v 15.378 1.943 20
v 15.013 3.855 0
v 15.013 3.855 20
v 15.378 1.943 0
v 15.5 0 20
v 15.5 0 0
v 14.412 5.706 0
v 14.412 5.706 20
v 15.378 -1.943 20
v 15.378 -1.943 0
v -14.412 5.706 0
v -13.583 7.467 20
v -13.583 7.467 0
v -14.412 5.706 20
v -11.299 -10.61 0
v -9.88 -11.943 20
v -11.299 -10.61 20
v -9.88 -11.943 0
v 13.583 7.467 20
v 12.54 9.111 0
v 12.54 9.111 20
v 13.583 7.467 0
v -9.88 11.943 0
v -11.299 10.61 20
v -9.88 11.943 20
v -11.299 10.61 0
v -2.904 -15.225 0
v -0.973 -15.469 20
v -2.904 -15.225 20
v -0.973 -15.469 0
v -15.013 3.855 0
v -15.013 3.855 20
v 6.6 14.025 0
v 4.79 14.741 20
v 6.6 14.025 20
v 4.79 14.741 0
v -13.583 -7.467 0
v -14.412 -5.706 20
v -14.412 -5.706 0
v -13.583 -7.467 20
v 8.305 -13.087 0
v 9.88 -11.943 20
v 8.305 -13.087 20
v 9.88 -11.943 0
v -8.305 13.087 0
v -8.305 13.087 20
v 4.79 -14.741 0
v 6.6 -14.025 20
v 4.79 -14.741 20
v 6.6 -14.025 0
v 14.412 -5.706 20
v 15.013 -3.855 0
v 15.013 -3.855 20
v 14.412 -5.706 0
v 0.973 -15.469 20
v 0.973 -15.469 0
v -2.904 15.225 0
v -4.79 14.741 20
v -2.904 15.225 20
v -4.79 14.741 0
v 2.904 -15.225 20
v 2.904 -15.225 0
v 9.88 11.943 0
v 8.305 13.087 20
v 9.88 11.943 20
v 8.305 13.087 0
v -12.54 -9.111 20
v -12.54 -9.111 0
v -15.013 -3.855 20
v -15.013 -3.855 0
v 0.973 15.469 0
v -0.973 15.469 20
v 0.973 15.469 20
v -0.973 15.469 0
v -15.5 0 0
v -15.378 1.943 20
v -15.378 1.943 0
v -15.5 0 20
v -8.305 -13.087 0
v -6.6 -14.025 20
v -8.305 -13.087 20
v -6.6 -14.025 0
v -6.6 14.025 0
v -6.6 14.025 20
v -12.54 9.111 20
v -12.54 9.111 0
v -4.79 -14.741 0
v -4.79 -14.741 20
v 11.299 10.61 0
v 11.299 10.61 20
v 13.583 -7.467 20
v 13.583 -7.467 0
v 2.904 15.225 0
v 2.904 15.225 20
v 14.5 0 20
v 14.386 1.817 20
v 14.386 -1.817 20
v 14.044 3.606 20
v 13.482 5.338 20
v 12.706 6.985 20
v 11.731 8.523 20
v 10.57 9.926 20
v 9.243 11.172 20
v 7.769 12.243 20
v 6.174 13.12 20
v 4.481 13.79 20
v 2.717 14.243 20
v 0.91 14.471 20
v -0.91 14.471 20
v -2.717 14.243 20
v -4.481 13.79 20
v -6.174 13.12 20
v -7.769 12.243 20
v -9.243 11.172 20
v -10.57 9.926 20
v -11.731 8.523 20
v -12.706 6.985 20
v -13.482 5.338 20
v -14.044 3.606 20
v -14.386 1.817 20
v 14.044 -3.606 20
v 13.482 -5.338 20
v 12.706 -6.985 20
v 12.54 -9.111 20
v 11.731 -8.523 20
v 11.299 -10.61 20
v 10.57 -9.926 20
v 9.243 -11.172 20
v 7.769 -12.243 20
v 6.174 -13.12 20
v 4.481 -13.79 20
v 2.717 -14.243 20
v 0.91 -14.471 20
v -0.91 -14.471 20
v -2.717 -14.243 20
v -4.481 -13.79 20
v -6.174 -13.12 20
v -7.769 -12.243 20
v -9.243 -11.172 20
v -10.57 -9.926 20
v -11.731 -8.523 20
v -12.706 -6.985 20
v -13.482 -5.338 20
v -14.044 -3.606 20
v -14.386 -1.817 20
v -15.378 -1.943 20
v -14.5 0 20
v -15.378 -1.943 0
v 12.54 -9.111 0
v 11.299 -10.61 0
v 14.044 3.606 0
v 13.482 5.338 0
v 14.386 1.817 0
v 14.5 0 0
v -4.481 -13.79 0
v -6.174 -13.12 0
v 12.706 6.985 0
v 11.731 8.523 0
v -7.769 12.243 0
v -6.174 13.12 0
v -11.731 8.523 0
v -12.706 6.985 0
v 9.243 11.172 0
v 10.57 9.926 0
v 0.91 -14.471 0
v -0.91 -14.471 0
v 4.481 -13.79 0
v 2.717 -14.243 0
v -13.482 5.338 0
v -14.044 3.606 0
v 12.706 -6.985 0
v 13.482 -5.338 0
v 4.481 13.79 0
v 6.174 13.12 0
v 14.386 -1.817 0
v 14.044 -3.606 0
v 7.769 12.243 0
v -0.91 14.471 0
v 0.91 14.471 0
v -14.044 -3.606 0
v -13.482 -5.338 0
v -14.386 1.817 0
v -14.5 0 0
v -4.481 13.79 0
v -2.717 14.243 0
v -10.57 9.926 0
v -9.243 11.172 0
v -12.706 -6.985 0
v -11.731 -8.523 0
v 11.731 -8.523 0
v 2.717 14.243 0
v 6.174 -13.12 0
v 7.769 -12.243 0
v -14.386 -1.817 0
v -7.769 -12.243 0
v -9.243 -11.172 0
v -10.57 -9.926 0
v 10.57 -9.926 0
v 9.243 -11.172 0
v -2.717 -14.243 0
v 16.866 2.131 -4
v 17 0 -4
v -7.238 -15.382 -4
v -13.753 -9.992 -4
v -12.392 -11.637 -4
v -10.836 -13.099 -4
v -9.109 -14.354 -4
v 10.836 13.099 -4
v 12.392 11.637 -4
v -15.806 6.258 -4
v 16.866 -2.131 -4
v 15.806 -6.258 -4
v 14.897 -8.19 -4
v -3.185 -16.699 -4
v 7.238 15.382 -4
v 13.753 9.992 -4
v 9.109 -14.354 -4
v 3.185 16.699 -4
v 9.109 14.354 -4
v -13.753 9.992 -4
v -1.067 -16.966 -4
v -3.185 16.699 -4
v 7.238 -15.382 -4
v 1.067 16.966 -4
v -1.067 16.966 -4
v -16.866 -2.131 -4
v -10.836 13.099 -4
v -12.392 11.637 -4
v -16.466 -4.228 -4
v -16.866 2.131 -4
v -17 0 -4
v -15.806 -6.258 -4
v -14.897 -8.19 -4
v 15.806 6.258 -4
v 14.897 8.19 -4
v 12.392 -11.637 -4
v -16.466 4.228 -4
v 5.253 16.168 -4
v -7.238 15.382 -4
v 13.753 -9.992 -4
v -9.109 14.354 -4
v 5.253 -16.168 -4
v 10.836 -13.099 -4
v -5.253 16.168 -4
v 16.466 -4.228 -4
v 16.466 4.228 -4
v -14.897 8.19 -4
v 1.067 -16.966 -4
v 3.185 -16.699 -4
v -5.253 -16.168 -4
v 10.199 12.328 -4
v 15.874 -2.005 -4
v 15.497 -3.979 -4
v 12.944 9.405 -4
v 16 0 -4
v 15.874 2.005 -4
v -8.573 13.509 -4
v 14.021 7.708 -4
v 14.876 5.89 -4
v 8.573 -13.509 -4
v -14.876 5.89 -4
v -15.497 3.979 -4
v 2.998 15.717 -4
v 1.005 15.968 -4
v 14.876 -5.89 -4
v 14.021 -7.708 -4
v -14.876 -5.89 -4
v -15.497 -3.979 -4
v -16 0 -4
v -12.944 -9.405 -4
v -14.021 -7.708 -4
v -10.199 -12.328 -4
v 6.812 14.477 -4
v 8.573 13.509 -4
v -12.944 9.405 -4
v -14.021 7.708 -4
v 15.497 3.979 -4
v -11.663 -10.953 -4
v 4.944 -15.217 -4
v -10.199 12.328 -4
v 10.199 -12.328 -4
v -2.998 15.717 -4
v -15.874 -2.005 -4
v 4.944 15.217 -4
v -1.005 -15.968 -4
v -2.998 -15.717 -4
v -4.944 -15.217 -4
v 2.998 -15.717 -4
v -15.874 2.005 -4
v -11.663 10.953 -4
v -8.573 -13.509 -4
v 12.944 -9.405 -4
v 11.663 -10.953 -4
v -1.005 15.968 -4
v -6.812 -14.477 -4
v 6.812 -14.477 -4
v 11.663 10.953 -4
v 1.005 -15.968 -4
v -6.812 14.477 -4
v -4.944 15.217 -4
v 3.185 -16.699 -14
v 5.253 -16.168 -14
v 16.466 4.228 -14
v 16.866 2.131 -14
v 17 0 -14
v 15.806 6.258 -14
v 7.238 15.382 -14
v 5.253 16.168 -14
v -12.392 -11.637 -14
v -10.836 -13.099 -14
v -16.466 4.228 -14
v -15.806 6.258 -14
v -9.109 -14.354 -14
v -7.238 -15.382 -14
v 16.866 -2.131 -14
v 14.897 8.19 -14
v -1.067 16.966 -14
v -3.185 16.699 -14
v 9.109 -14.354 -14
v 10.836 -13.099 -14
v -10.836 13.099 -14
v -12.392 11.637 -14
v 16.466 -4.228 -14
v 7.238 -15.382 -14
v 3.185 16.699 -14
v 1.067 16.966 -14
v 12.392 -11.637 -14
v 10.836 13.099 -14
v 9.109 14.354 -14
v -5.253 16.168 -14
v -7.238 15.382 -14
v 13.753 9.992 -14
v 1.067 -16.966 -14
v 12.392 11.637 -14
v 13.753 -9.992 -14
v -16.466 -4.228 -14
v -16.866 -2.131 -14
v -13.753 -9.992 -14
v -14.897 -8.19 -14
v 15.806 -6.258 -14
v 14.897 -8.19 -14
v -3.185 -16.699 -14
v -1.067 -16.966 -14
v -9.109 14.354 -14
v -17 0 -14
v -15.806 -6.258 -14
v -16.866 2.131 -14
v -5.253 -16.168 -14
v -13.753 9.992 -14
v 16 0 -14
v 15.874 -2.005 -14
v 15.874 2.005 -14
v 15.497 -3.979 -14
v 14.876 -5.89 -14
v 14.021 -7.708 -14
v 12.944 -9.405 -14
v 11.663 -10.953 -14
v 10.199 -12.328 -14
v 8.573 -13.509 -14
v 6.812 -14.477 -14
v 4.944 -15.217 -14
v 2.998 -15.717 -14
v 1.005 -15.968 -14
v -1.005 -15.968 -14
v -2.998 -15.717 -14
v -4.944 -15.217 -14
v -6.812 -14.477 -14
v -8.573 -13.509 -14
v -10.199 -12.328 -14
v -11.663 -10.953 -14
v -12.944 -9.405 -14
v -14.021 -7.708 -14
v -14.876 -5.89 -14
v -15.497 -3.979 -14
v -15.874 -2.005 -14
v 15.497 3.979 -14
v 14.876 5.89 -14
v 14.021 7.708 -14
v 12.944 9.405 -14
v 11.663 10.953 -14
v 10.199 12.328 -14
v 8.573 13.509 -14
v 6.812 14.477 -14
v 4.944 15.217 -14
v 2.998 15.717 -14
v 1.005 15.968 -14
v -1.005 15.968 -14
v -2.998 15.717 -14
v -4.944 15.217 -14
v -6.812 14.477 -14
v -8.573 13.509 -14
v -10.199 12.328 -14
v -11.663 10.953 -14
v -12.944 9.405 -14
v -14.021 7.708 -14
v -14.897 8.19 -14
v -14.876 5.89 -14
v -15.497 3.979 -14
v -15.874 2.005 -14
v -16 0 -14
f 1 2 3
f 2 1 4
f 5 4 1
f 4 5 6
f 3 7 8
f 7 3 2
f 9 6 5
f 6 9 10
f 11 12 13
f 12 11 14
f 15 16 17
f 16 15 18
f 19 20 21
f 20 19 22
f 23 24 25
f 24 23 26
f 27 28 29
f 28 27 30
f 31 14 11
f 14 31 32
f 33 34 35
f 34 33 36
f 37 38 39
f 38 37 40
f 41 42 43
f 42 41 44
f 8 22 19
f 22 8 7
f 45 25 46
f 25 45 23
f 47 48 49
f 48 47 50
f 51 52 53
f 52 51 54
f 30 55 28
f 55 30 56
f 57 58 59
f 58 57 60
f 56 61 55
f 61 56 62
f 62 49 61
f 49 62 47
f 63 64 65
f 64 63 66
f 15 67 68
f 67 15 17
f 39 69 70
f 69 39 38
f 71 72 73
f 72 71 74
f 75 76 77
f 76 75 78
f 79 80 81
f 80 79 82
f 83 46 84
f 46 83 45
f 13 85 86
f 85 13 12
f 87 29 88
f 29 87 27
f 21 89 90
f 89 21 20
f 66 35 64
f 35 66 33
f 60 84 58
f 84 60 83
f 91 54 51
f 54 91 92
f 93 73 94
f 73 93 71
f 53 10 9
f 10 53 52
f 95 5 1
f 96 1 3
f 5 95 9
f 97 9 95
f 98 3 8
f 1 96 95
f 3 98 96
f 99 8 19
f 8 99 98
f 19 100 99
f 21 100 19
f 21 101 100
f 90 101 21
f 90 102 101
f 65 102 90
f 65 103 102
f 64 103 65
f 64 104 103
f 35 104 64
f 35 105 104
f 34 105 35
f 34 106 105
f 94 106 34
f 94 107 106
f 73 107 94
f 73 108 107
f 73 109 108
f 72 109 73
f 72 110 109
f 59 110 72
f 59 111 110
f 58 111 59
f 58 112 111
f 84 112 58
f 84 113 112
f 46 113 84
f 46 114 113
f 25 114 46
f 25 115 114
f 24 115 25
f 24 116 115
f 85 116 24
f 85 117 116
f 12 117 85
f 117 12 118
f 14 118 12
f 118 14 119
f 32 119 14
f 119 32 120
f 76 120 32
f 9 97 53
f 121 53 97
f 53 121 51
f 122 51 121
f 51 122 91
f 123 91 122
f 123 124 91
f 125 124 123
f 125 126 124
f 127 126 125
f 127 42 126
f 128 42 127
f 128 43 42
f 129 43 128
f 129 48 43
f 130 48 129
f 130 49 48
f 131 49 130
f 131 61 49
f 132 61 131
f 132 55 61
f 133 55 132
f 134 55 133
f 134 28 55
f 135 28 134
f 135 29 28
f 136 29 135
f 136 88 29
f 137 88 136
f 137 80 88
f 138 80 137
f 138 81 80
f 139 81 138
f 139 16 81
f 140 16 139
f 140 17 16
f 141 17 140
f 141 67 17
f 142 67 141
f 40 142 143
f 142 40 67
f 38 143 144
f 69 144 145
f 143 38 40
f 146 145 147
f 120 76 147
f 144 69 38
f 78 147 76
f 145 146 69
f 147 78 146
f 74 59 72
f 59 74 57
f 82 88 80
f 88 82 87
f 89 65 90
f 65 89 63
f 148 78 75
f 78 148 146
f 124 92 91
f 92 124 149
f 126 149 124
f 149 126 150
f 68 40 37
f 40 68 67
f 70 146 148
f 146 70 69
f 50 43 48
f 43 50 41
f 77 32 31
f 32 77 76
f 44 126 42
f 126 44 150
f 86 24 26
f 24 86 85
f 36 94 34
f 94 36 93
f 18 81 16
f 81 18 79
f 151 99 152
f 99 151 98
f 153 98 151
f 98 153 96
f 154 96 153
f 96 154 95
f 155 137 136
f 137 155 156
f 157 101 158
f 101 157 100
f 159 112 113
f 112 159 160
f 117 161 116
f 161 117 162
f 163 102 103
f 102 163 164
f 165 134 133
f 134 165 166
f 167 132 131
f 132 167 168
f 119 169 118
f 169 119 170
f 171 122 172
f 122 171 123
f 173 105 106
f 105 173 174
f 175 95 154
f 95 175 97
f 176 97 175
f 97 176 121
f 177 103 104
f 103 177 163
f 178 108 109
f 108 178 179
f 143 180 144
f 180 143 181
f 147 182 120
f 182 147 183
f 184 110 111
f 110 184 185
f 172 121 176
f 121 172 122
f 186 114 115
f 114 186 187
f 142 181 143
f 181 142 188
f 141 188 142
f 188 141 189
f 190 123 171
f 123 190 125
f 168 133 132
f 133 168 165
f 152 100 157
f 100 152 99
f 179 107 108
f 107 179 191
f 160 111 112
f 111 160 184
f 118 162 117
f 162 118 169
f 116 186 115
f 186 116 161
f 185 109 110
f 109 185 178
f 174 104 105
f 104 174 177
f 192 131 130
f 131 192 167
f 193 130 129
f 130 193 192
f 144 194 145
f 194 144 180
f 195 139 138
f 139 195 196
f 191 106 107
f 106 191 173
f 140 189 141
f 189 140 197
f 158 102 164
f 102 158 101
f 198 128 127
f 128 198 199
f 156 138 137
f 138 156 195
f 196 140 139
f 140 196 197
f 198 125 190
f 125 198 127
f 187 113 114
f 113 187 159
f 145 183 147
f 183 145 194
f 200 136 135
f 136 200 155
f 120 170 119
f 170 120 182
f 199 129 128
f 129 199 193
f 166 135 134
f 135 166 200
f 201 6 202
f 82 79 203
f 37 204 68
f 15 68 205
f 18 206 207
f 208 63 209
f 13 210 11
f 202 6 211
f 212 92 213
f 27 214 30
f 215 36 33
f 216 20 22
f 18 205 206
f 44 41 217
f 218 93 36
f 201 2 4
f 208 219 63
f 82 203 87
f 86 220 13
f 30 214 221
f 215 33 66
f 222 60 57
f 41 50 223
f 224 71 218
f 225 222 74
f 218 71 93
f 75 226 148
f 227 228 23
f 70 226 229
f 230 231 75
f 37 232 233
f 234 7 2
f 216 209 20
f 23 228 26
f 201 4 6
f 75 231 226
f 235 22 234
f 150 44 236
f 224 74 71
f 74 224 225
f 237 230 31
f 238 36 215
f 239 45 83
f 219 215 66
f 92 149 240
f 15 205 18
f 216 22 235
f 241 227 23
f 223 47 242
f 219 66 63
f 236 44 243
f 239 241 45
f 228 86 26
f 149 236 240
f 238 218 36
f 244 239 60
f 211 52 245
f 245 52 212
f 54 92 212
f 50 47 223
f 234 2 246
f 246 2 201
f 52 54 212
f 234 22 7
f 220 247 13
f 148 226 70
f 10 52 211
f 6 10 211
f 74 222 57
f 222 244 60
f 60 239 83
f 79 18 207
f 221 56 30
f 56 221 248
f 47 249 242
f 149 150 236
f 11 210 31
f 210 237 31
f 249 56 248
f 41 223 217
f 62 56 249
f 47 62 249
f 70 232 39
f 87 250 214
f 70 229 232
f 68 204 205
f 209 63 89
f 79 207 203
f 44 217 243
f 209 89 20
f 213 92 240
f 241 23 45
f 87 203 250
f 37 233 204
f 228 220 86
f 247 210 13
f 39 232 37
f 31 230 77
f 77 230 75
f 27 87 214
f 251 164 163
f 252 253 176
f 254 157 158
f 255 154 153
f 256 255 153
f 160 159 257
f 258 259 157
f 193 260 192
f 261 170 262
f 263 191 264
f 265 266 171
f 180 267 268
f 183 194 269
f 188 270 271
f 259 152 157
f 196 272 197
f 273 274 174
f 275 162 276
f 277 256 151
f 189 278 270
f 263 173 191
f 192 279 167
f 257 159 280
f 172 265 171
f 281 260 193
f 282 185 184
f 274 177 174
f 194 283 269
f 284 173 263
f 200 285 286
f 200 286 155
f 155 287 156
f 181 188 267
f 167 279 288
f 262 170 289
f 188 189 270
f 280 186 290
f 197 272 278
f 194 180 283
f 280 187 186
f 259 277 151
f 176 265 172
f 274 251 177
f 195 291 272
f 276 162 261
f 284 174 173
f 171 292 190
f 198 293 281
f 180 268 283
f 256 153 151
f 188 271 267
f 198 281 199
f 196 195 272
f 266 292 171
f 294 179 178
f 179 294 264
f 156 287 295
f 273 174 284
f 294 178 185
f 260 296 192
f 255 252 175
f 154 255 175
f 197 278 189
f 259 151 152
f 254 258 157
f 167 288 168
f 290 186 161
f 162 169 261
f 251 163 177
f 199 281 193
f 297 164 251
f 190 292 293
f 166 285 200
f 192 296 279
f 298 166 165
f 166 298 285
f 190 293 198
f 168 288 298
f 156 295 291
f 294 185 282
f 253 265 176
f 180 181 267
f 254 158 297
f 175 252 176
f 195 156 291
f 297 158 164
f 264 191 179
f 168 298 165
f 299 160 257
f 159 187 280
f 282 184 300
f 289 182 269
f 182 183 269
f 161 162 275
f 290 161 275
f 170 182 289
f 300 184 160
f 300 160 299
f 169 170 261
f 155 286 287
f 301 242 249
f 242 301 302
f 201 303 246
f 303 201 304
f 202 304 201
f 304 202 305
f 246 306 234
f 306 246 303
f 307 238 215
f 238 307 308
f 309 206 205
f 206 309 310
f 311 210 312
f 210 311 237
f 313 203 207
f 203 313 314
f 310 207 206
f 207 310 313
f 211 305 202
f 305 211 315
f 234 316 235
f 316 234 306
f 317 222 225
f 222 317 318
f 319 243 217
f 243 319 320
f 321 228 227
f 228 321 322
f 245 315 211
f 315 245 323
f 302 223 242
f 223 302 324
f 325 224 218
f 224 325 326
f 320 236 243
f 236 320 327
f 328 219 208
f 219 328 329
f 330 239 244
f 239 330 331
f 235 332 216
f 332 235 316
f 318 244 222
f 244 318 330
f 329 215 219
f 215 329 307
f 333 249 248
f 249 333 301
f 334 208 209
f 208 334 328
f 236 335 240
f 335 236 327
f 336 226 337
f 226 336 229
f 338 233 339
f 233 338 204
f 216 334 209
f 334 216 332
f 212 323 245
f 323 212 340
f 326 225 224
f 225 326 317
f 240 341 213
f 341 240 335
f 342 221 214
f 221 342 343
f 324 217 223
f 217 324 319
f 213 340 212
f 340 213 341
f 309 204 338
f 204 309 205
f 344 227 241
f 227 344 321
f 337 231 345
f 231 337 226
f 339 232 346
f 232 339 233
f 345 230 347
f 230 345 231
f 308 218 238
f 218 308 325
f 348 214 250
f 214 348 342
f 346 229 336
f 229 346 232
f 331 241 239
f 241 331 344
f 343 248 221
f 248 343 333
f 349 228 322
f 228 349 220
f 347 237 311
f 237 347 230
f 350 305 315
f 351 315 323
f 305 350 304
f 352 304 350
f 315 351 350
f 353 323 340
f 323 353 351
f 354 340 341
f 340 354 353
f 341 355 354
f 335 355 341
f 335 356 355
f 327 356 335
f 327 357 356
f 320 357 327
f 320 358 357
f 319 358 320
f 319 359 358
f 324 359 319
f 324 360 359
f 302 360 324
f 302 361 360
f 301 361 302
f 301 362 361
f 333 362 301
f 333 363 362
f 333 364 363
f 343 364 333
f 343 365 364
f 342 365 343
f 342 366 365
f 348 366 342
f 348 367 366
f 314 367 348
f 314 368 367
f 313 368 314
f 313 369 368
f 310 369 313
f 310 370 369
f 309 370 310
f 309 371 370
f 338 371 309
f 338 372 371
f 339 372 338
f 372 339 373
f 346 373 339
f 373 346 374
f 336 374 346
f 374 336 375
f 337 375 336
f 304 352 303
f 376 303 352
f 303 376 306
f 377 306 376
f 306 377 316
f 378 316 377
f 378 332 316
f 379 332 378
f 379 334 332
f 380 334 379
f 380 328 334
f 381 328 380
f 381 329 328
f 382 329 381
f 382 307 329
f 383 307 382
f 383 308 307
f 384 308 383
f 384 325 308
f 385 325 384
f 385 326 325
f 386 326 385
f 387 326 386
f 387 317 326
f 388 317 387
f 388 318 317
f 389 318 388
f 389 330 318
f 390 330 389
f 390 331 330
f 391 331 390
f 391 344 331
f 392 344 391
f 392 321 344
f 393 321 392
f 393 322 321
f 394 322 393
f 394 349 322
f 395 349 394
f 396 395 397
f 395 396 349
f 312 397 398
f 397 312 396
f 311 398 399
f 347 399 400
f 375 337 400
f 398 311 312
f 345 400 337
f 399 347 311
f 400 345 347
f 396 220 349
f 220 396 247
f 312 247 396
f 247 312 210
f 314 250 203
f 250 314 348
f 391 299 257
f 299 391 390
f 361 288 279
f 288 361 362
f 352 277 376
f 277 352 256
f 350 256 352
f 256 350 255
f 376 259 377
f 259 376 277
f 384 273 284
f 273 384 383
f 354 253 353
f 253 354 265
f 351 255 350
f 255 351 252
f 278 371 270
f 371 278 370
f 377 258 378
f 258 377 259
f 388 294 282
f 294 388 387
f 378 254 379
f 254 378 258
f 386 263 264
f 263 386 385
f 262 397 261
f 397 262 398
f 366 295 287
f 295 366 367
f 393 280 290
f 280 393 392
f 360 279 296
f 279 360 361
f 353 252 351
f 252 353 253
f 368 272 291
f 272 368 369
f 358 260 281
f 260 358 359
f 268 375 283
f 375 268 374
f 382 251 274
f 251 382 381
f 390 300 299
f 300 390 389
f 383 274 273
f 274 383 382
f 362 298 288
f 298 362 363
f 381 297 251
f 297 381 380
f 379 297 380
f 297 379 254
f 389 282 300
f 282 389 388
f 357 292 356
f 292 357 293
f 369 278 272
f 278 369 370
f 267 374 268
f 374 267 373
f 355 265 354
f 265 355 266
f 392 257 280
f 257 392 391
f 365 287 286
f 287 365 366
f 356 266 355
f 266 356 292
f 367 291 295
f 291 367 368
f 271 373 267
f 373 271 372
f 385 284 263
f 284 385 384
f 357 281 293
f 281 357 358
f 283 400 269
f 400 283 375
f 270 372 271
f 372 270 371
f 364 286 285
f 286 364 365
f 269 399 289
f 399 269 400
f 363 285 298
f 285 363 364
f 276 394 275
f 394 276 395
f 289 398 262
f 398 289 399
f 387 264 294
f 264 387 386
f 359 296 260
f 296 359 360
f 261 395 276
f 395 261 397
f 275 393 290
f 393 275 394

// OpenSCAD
// v 0.2

$fn = 50;

input_external_radius = 31;
input_internal_radius =  29;
input_width = 20;


output_external_radius = 34;
output_internal_radius =  32;
output_width = 10;

adapt_width = 4;

echo (str("Total width = ", output_width + input_width + adapt_width, " mm"));
union(){
    difference(){
        cylinder(input_width, d1=input_external_radius, d2=input_external_radius);
        cylinder(input_width, d1=input_internal_radius, d2=input_internal_radius);
    }

    translate([0,0, -adapt_width])
    difference(){
        cylinder(adapt_width, d2=input_external_radius, d1=output_external_radius);
        cylinder(adapt_width, d2=input_internal_radius, d1=output_internal_radius);
    }

    translate([0,0, -output_width -adapt_width])
    difference(){
        cylinder(output_width, d1=output_external_radius, d2=output_external_radius);
        cylinder(output_width, d1=output_internal_radius, d2=output_internal_radius);
    }
}
